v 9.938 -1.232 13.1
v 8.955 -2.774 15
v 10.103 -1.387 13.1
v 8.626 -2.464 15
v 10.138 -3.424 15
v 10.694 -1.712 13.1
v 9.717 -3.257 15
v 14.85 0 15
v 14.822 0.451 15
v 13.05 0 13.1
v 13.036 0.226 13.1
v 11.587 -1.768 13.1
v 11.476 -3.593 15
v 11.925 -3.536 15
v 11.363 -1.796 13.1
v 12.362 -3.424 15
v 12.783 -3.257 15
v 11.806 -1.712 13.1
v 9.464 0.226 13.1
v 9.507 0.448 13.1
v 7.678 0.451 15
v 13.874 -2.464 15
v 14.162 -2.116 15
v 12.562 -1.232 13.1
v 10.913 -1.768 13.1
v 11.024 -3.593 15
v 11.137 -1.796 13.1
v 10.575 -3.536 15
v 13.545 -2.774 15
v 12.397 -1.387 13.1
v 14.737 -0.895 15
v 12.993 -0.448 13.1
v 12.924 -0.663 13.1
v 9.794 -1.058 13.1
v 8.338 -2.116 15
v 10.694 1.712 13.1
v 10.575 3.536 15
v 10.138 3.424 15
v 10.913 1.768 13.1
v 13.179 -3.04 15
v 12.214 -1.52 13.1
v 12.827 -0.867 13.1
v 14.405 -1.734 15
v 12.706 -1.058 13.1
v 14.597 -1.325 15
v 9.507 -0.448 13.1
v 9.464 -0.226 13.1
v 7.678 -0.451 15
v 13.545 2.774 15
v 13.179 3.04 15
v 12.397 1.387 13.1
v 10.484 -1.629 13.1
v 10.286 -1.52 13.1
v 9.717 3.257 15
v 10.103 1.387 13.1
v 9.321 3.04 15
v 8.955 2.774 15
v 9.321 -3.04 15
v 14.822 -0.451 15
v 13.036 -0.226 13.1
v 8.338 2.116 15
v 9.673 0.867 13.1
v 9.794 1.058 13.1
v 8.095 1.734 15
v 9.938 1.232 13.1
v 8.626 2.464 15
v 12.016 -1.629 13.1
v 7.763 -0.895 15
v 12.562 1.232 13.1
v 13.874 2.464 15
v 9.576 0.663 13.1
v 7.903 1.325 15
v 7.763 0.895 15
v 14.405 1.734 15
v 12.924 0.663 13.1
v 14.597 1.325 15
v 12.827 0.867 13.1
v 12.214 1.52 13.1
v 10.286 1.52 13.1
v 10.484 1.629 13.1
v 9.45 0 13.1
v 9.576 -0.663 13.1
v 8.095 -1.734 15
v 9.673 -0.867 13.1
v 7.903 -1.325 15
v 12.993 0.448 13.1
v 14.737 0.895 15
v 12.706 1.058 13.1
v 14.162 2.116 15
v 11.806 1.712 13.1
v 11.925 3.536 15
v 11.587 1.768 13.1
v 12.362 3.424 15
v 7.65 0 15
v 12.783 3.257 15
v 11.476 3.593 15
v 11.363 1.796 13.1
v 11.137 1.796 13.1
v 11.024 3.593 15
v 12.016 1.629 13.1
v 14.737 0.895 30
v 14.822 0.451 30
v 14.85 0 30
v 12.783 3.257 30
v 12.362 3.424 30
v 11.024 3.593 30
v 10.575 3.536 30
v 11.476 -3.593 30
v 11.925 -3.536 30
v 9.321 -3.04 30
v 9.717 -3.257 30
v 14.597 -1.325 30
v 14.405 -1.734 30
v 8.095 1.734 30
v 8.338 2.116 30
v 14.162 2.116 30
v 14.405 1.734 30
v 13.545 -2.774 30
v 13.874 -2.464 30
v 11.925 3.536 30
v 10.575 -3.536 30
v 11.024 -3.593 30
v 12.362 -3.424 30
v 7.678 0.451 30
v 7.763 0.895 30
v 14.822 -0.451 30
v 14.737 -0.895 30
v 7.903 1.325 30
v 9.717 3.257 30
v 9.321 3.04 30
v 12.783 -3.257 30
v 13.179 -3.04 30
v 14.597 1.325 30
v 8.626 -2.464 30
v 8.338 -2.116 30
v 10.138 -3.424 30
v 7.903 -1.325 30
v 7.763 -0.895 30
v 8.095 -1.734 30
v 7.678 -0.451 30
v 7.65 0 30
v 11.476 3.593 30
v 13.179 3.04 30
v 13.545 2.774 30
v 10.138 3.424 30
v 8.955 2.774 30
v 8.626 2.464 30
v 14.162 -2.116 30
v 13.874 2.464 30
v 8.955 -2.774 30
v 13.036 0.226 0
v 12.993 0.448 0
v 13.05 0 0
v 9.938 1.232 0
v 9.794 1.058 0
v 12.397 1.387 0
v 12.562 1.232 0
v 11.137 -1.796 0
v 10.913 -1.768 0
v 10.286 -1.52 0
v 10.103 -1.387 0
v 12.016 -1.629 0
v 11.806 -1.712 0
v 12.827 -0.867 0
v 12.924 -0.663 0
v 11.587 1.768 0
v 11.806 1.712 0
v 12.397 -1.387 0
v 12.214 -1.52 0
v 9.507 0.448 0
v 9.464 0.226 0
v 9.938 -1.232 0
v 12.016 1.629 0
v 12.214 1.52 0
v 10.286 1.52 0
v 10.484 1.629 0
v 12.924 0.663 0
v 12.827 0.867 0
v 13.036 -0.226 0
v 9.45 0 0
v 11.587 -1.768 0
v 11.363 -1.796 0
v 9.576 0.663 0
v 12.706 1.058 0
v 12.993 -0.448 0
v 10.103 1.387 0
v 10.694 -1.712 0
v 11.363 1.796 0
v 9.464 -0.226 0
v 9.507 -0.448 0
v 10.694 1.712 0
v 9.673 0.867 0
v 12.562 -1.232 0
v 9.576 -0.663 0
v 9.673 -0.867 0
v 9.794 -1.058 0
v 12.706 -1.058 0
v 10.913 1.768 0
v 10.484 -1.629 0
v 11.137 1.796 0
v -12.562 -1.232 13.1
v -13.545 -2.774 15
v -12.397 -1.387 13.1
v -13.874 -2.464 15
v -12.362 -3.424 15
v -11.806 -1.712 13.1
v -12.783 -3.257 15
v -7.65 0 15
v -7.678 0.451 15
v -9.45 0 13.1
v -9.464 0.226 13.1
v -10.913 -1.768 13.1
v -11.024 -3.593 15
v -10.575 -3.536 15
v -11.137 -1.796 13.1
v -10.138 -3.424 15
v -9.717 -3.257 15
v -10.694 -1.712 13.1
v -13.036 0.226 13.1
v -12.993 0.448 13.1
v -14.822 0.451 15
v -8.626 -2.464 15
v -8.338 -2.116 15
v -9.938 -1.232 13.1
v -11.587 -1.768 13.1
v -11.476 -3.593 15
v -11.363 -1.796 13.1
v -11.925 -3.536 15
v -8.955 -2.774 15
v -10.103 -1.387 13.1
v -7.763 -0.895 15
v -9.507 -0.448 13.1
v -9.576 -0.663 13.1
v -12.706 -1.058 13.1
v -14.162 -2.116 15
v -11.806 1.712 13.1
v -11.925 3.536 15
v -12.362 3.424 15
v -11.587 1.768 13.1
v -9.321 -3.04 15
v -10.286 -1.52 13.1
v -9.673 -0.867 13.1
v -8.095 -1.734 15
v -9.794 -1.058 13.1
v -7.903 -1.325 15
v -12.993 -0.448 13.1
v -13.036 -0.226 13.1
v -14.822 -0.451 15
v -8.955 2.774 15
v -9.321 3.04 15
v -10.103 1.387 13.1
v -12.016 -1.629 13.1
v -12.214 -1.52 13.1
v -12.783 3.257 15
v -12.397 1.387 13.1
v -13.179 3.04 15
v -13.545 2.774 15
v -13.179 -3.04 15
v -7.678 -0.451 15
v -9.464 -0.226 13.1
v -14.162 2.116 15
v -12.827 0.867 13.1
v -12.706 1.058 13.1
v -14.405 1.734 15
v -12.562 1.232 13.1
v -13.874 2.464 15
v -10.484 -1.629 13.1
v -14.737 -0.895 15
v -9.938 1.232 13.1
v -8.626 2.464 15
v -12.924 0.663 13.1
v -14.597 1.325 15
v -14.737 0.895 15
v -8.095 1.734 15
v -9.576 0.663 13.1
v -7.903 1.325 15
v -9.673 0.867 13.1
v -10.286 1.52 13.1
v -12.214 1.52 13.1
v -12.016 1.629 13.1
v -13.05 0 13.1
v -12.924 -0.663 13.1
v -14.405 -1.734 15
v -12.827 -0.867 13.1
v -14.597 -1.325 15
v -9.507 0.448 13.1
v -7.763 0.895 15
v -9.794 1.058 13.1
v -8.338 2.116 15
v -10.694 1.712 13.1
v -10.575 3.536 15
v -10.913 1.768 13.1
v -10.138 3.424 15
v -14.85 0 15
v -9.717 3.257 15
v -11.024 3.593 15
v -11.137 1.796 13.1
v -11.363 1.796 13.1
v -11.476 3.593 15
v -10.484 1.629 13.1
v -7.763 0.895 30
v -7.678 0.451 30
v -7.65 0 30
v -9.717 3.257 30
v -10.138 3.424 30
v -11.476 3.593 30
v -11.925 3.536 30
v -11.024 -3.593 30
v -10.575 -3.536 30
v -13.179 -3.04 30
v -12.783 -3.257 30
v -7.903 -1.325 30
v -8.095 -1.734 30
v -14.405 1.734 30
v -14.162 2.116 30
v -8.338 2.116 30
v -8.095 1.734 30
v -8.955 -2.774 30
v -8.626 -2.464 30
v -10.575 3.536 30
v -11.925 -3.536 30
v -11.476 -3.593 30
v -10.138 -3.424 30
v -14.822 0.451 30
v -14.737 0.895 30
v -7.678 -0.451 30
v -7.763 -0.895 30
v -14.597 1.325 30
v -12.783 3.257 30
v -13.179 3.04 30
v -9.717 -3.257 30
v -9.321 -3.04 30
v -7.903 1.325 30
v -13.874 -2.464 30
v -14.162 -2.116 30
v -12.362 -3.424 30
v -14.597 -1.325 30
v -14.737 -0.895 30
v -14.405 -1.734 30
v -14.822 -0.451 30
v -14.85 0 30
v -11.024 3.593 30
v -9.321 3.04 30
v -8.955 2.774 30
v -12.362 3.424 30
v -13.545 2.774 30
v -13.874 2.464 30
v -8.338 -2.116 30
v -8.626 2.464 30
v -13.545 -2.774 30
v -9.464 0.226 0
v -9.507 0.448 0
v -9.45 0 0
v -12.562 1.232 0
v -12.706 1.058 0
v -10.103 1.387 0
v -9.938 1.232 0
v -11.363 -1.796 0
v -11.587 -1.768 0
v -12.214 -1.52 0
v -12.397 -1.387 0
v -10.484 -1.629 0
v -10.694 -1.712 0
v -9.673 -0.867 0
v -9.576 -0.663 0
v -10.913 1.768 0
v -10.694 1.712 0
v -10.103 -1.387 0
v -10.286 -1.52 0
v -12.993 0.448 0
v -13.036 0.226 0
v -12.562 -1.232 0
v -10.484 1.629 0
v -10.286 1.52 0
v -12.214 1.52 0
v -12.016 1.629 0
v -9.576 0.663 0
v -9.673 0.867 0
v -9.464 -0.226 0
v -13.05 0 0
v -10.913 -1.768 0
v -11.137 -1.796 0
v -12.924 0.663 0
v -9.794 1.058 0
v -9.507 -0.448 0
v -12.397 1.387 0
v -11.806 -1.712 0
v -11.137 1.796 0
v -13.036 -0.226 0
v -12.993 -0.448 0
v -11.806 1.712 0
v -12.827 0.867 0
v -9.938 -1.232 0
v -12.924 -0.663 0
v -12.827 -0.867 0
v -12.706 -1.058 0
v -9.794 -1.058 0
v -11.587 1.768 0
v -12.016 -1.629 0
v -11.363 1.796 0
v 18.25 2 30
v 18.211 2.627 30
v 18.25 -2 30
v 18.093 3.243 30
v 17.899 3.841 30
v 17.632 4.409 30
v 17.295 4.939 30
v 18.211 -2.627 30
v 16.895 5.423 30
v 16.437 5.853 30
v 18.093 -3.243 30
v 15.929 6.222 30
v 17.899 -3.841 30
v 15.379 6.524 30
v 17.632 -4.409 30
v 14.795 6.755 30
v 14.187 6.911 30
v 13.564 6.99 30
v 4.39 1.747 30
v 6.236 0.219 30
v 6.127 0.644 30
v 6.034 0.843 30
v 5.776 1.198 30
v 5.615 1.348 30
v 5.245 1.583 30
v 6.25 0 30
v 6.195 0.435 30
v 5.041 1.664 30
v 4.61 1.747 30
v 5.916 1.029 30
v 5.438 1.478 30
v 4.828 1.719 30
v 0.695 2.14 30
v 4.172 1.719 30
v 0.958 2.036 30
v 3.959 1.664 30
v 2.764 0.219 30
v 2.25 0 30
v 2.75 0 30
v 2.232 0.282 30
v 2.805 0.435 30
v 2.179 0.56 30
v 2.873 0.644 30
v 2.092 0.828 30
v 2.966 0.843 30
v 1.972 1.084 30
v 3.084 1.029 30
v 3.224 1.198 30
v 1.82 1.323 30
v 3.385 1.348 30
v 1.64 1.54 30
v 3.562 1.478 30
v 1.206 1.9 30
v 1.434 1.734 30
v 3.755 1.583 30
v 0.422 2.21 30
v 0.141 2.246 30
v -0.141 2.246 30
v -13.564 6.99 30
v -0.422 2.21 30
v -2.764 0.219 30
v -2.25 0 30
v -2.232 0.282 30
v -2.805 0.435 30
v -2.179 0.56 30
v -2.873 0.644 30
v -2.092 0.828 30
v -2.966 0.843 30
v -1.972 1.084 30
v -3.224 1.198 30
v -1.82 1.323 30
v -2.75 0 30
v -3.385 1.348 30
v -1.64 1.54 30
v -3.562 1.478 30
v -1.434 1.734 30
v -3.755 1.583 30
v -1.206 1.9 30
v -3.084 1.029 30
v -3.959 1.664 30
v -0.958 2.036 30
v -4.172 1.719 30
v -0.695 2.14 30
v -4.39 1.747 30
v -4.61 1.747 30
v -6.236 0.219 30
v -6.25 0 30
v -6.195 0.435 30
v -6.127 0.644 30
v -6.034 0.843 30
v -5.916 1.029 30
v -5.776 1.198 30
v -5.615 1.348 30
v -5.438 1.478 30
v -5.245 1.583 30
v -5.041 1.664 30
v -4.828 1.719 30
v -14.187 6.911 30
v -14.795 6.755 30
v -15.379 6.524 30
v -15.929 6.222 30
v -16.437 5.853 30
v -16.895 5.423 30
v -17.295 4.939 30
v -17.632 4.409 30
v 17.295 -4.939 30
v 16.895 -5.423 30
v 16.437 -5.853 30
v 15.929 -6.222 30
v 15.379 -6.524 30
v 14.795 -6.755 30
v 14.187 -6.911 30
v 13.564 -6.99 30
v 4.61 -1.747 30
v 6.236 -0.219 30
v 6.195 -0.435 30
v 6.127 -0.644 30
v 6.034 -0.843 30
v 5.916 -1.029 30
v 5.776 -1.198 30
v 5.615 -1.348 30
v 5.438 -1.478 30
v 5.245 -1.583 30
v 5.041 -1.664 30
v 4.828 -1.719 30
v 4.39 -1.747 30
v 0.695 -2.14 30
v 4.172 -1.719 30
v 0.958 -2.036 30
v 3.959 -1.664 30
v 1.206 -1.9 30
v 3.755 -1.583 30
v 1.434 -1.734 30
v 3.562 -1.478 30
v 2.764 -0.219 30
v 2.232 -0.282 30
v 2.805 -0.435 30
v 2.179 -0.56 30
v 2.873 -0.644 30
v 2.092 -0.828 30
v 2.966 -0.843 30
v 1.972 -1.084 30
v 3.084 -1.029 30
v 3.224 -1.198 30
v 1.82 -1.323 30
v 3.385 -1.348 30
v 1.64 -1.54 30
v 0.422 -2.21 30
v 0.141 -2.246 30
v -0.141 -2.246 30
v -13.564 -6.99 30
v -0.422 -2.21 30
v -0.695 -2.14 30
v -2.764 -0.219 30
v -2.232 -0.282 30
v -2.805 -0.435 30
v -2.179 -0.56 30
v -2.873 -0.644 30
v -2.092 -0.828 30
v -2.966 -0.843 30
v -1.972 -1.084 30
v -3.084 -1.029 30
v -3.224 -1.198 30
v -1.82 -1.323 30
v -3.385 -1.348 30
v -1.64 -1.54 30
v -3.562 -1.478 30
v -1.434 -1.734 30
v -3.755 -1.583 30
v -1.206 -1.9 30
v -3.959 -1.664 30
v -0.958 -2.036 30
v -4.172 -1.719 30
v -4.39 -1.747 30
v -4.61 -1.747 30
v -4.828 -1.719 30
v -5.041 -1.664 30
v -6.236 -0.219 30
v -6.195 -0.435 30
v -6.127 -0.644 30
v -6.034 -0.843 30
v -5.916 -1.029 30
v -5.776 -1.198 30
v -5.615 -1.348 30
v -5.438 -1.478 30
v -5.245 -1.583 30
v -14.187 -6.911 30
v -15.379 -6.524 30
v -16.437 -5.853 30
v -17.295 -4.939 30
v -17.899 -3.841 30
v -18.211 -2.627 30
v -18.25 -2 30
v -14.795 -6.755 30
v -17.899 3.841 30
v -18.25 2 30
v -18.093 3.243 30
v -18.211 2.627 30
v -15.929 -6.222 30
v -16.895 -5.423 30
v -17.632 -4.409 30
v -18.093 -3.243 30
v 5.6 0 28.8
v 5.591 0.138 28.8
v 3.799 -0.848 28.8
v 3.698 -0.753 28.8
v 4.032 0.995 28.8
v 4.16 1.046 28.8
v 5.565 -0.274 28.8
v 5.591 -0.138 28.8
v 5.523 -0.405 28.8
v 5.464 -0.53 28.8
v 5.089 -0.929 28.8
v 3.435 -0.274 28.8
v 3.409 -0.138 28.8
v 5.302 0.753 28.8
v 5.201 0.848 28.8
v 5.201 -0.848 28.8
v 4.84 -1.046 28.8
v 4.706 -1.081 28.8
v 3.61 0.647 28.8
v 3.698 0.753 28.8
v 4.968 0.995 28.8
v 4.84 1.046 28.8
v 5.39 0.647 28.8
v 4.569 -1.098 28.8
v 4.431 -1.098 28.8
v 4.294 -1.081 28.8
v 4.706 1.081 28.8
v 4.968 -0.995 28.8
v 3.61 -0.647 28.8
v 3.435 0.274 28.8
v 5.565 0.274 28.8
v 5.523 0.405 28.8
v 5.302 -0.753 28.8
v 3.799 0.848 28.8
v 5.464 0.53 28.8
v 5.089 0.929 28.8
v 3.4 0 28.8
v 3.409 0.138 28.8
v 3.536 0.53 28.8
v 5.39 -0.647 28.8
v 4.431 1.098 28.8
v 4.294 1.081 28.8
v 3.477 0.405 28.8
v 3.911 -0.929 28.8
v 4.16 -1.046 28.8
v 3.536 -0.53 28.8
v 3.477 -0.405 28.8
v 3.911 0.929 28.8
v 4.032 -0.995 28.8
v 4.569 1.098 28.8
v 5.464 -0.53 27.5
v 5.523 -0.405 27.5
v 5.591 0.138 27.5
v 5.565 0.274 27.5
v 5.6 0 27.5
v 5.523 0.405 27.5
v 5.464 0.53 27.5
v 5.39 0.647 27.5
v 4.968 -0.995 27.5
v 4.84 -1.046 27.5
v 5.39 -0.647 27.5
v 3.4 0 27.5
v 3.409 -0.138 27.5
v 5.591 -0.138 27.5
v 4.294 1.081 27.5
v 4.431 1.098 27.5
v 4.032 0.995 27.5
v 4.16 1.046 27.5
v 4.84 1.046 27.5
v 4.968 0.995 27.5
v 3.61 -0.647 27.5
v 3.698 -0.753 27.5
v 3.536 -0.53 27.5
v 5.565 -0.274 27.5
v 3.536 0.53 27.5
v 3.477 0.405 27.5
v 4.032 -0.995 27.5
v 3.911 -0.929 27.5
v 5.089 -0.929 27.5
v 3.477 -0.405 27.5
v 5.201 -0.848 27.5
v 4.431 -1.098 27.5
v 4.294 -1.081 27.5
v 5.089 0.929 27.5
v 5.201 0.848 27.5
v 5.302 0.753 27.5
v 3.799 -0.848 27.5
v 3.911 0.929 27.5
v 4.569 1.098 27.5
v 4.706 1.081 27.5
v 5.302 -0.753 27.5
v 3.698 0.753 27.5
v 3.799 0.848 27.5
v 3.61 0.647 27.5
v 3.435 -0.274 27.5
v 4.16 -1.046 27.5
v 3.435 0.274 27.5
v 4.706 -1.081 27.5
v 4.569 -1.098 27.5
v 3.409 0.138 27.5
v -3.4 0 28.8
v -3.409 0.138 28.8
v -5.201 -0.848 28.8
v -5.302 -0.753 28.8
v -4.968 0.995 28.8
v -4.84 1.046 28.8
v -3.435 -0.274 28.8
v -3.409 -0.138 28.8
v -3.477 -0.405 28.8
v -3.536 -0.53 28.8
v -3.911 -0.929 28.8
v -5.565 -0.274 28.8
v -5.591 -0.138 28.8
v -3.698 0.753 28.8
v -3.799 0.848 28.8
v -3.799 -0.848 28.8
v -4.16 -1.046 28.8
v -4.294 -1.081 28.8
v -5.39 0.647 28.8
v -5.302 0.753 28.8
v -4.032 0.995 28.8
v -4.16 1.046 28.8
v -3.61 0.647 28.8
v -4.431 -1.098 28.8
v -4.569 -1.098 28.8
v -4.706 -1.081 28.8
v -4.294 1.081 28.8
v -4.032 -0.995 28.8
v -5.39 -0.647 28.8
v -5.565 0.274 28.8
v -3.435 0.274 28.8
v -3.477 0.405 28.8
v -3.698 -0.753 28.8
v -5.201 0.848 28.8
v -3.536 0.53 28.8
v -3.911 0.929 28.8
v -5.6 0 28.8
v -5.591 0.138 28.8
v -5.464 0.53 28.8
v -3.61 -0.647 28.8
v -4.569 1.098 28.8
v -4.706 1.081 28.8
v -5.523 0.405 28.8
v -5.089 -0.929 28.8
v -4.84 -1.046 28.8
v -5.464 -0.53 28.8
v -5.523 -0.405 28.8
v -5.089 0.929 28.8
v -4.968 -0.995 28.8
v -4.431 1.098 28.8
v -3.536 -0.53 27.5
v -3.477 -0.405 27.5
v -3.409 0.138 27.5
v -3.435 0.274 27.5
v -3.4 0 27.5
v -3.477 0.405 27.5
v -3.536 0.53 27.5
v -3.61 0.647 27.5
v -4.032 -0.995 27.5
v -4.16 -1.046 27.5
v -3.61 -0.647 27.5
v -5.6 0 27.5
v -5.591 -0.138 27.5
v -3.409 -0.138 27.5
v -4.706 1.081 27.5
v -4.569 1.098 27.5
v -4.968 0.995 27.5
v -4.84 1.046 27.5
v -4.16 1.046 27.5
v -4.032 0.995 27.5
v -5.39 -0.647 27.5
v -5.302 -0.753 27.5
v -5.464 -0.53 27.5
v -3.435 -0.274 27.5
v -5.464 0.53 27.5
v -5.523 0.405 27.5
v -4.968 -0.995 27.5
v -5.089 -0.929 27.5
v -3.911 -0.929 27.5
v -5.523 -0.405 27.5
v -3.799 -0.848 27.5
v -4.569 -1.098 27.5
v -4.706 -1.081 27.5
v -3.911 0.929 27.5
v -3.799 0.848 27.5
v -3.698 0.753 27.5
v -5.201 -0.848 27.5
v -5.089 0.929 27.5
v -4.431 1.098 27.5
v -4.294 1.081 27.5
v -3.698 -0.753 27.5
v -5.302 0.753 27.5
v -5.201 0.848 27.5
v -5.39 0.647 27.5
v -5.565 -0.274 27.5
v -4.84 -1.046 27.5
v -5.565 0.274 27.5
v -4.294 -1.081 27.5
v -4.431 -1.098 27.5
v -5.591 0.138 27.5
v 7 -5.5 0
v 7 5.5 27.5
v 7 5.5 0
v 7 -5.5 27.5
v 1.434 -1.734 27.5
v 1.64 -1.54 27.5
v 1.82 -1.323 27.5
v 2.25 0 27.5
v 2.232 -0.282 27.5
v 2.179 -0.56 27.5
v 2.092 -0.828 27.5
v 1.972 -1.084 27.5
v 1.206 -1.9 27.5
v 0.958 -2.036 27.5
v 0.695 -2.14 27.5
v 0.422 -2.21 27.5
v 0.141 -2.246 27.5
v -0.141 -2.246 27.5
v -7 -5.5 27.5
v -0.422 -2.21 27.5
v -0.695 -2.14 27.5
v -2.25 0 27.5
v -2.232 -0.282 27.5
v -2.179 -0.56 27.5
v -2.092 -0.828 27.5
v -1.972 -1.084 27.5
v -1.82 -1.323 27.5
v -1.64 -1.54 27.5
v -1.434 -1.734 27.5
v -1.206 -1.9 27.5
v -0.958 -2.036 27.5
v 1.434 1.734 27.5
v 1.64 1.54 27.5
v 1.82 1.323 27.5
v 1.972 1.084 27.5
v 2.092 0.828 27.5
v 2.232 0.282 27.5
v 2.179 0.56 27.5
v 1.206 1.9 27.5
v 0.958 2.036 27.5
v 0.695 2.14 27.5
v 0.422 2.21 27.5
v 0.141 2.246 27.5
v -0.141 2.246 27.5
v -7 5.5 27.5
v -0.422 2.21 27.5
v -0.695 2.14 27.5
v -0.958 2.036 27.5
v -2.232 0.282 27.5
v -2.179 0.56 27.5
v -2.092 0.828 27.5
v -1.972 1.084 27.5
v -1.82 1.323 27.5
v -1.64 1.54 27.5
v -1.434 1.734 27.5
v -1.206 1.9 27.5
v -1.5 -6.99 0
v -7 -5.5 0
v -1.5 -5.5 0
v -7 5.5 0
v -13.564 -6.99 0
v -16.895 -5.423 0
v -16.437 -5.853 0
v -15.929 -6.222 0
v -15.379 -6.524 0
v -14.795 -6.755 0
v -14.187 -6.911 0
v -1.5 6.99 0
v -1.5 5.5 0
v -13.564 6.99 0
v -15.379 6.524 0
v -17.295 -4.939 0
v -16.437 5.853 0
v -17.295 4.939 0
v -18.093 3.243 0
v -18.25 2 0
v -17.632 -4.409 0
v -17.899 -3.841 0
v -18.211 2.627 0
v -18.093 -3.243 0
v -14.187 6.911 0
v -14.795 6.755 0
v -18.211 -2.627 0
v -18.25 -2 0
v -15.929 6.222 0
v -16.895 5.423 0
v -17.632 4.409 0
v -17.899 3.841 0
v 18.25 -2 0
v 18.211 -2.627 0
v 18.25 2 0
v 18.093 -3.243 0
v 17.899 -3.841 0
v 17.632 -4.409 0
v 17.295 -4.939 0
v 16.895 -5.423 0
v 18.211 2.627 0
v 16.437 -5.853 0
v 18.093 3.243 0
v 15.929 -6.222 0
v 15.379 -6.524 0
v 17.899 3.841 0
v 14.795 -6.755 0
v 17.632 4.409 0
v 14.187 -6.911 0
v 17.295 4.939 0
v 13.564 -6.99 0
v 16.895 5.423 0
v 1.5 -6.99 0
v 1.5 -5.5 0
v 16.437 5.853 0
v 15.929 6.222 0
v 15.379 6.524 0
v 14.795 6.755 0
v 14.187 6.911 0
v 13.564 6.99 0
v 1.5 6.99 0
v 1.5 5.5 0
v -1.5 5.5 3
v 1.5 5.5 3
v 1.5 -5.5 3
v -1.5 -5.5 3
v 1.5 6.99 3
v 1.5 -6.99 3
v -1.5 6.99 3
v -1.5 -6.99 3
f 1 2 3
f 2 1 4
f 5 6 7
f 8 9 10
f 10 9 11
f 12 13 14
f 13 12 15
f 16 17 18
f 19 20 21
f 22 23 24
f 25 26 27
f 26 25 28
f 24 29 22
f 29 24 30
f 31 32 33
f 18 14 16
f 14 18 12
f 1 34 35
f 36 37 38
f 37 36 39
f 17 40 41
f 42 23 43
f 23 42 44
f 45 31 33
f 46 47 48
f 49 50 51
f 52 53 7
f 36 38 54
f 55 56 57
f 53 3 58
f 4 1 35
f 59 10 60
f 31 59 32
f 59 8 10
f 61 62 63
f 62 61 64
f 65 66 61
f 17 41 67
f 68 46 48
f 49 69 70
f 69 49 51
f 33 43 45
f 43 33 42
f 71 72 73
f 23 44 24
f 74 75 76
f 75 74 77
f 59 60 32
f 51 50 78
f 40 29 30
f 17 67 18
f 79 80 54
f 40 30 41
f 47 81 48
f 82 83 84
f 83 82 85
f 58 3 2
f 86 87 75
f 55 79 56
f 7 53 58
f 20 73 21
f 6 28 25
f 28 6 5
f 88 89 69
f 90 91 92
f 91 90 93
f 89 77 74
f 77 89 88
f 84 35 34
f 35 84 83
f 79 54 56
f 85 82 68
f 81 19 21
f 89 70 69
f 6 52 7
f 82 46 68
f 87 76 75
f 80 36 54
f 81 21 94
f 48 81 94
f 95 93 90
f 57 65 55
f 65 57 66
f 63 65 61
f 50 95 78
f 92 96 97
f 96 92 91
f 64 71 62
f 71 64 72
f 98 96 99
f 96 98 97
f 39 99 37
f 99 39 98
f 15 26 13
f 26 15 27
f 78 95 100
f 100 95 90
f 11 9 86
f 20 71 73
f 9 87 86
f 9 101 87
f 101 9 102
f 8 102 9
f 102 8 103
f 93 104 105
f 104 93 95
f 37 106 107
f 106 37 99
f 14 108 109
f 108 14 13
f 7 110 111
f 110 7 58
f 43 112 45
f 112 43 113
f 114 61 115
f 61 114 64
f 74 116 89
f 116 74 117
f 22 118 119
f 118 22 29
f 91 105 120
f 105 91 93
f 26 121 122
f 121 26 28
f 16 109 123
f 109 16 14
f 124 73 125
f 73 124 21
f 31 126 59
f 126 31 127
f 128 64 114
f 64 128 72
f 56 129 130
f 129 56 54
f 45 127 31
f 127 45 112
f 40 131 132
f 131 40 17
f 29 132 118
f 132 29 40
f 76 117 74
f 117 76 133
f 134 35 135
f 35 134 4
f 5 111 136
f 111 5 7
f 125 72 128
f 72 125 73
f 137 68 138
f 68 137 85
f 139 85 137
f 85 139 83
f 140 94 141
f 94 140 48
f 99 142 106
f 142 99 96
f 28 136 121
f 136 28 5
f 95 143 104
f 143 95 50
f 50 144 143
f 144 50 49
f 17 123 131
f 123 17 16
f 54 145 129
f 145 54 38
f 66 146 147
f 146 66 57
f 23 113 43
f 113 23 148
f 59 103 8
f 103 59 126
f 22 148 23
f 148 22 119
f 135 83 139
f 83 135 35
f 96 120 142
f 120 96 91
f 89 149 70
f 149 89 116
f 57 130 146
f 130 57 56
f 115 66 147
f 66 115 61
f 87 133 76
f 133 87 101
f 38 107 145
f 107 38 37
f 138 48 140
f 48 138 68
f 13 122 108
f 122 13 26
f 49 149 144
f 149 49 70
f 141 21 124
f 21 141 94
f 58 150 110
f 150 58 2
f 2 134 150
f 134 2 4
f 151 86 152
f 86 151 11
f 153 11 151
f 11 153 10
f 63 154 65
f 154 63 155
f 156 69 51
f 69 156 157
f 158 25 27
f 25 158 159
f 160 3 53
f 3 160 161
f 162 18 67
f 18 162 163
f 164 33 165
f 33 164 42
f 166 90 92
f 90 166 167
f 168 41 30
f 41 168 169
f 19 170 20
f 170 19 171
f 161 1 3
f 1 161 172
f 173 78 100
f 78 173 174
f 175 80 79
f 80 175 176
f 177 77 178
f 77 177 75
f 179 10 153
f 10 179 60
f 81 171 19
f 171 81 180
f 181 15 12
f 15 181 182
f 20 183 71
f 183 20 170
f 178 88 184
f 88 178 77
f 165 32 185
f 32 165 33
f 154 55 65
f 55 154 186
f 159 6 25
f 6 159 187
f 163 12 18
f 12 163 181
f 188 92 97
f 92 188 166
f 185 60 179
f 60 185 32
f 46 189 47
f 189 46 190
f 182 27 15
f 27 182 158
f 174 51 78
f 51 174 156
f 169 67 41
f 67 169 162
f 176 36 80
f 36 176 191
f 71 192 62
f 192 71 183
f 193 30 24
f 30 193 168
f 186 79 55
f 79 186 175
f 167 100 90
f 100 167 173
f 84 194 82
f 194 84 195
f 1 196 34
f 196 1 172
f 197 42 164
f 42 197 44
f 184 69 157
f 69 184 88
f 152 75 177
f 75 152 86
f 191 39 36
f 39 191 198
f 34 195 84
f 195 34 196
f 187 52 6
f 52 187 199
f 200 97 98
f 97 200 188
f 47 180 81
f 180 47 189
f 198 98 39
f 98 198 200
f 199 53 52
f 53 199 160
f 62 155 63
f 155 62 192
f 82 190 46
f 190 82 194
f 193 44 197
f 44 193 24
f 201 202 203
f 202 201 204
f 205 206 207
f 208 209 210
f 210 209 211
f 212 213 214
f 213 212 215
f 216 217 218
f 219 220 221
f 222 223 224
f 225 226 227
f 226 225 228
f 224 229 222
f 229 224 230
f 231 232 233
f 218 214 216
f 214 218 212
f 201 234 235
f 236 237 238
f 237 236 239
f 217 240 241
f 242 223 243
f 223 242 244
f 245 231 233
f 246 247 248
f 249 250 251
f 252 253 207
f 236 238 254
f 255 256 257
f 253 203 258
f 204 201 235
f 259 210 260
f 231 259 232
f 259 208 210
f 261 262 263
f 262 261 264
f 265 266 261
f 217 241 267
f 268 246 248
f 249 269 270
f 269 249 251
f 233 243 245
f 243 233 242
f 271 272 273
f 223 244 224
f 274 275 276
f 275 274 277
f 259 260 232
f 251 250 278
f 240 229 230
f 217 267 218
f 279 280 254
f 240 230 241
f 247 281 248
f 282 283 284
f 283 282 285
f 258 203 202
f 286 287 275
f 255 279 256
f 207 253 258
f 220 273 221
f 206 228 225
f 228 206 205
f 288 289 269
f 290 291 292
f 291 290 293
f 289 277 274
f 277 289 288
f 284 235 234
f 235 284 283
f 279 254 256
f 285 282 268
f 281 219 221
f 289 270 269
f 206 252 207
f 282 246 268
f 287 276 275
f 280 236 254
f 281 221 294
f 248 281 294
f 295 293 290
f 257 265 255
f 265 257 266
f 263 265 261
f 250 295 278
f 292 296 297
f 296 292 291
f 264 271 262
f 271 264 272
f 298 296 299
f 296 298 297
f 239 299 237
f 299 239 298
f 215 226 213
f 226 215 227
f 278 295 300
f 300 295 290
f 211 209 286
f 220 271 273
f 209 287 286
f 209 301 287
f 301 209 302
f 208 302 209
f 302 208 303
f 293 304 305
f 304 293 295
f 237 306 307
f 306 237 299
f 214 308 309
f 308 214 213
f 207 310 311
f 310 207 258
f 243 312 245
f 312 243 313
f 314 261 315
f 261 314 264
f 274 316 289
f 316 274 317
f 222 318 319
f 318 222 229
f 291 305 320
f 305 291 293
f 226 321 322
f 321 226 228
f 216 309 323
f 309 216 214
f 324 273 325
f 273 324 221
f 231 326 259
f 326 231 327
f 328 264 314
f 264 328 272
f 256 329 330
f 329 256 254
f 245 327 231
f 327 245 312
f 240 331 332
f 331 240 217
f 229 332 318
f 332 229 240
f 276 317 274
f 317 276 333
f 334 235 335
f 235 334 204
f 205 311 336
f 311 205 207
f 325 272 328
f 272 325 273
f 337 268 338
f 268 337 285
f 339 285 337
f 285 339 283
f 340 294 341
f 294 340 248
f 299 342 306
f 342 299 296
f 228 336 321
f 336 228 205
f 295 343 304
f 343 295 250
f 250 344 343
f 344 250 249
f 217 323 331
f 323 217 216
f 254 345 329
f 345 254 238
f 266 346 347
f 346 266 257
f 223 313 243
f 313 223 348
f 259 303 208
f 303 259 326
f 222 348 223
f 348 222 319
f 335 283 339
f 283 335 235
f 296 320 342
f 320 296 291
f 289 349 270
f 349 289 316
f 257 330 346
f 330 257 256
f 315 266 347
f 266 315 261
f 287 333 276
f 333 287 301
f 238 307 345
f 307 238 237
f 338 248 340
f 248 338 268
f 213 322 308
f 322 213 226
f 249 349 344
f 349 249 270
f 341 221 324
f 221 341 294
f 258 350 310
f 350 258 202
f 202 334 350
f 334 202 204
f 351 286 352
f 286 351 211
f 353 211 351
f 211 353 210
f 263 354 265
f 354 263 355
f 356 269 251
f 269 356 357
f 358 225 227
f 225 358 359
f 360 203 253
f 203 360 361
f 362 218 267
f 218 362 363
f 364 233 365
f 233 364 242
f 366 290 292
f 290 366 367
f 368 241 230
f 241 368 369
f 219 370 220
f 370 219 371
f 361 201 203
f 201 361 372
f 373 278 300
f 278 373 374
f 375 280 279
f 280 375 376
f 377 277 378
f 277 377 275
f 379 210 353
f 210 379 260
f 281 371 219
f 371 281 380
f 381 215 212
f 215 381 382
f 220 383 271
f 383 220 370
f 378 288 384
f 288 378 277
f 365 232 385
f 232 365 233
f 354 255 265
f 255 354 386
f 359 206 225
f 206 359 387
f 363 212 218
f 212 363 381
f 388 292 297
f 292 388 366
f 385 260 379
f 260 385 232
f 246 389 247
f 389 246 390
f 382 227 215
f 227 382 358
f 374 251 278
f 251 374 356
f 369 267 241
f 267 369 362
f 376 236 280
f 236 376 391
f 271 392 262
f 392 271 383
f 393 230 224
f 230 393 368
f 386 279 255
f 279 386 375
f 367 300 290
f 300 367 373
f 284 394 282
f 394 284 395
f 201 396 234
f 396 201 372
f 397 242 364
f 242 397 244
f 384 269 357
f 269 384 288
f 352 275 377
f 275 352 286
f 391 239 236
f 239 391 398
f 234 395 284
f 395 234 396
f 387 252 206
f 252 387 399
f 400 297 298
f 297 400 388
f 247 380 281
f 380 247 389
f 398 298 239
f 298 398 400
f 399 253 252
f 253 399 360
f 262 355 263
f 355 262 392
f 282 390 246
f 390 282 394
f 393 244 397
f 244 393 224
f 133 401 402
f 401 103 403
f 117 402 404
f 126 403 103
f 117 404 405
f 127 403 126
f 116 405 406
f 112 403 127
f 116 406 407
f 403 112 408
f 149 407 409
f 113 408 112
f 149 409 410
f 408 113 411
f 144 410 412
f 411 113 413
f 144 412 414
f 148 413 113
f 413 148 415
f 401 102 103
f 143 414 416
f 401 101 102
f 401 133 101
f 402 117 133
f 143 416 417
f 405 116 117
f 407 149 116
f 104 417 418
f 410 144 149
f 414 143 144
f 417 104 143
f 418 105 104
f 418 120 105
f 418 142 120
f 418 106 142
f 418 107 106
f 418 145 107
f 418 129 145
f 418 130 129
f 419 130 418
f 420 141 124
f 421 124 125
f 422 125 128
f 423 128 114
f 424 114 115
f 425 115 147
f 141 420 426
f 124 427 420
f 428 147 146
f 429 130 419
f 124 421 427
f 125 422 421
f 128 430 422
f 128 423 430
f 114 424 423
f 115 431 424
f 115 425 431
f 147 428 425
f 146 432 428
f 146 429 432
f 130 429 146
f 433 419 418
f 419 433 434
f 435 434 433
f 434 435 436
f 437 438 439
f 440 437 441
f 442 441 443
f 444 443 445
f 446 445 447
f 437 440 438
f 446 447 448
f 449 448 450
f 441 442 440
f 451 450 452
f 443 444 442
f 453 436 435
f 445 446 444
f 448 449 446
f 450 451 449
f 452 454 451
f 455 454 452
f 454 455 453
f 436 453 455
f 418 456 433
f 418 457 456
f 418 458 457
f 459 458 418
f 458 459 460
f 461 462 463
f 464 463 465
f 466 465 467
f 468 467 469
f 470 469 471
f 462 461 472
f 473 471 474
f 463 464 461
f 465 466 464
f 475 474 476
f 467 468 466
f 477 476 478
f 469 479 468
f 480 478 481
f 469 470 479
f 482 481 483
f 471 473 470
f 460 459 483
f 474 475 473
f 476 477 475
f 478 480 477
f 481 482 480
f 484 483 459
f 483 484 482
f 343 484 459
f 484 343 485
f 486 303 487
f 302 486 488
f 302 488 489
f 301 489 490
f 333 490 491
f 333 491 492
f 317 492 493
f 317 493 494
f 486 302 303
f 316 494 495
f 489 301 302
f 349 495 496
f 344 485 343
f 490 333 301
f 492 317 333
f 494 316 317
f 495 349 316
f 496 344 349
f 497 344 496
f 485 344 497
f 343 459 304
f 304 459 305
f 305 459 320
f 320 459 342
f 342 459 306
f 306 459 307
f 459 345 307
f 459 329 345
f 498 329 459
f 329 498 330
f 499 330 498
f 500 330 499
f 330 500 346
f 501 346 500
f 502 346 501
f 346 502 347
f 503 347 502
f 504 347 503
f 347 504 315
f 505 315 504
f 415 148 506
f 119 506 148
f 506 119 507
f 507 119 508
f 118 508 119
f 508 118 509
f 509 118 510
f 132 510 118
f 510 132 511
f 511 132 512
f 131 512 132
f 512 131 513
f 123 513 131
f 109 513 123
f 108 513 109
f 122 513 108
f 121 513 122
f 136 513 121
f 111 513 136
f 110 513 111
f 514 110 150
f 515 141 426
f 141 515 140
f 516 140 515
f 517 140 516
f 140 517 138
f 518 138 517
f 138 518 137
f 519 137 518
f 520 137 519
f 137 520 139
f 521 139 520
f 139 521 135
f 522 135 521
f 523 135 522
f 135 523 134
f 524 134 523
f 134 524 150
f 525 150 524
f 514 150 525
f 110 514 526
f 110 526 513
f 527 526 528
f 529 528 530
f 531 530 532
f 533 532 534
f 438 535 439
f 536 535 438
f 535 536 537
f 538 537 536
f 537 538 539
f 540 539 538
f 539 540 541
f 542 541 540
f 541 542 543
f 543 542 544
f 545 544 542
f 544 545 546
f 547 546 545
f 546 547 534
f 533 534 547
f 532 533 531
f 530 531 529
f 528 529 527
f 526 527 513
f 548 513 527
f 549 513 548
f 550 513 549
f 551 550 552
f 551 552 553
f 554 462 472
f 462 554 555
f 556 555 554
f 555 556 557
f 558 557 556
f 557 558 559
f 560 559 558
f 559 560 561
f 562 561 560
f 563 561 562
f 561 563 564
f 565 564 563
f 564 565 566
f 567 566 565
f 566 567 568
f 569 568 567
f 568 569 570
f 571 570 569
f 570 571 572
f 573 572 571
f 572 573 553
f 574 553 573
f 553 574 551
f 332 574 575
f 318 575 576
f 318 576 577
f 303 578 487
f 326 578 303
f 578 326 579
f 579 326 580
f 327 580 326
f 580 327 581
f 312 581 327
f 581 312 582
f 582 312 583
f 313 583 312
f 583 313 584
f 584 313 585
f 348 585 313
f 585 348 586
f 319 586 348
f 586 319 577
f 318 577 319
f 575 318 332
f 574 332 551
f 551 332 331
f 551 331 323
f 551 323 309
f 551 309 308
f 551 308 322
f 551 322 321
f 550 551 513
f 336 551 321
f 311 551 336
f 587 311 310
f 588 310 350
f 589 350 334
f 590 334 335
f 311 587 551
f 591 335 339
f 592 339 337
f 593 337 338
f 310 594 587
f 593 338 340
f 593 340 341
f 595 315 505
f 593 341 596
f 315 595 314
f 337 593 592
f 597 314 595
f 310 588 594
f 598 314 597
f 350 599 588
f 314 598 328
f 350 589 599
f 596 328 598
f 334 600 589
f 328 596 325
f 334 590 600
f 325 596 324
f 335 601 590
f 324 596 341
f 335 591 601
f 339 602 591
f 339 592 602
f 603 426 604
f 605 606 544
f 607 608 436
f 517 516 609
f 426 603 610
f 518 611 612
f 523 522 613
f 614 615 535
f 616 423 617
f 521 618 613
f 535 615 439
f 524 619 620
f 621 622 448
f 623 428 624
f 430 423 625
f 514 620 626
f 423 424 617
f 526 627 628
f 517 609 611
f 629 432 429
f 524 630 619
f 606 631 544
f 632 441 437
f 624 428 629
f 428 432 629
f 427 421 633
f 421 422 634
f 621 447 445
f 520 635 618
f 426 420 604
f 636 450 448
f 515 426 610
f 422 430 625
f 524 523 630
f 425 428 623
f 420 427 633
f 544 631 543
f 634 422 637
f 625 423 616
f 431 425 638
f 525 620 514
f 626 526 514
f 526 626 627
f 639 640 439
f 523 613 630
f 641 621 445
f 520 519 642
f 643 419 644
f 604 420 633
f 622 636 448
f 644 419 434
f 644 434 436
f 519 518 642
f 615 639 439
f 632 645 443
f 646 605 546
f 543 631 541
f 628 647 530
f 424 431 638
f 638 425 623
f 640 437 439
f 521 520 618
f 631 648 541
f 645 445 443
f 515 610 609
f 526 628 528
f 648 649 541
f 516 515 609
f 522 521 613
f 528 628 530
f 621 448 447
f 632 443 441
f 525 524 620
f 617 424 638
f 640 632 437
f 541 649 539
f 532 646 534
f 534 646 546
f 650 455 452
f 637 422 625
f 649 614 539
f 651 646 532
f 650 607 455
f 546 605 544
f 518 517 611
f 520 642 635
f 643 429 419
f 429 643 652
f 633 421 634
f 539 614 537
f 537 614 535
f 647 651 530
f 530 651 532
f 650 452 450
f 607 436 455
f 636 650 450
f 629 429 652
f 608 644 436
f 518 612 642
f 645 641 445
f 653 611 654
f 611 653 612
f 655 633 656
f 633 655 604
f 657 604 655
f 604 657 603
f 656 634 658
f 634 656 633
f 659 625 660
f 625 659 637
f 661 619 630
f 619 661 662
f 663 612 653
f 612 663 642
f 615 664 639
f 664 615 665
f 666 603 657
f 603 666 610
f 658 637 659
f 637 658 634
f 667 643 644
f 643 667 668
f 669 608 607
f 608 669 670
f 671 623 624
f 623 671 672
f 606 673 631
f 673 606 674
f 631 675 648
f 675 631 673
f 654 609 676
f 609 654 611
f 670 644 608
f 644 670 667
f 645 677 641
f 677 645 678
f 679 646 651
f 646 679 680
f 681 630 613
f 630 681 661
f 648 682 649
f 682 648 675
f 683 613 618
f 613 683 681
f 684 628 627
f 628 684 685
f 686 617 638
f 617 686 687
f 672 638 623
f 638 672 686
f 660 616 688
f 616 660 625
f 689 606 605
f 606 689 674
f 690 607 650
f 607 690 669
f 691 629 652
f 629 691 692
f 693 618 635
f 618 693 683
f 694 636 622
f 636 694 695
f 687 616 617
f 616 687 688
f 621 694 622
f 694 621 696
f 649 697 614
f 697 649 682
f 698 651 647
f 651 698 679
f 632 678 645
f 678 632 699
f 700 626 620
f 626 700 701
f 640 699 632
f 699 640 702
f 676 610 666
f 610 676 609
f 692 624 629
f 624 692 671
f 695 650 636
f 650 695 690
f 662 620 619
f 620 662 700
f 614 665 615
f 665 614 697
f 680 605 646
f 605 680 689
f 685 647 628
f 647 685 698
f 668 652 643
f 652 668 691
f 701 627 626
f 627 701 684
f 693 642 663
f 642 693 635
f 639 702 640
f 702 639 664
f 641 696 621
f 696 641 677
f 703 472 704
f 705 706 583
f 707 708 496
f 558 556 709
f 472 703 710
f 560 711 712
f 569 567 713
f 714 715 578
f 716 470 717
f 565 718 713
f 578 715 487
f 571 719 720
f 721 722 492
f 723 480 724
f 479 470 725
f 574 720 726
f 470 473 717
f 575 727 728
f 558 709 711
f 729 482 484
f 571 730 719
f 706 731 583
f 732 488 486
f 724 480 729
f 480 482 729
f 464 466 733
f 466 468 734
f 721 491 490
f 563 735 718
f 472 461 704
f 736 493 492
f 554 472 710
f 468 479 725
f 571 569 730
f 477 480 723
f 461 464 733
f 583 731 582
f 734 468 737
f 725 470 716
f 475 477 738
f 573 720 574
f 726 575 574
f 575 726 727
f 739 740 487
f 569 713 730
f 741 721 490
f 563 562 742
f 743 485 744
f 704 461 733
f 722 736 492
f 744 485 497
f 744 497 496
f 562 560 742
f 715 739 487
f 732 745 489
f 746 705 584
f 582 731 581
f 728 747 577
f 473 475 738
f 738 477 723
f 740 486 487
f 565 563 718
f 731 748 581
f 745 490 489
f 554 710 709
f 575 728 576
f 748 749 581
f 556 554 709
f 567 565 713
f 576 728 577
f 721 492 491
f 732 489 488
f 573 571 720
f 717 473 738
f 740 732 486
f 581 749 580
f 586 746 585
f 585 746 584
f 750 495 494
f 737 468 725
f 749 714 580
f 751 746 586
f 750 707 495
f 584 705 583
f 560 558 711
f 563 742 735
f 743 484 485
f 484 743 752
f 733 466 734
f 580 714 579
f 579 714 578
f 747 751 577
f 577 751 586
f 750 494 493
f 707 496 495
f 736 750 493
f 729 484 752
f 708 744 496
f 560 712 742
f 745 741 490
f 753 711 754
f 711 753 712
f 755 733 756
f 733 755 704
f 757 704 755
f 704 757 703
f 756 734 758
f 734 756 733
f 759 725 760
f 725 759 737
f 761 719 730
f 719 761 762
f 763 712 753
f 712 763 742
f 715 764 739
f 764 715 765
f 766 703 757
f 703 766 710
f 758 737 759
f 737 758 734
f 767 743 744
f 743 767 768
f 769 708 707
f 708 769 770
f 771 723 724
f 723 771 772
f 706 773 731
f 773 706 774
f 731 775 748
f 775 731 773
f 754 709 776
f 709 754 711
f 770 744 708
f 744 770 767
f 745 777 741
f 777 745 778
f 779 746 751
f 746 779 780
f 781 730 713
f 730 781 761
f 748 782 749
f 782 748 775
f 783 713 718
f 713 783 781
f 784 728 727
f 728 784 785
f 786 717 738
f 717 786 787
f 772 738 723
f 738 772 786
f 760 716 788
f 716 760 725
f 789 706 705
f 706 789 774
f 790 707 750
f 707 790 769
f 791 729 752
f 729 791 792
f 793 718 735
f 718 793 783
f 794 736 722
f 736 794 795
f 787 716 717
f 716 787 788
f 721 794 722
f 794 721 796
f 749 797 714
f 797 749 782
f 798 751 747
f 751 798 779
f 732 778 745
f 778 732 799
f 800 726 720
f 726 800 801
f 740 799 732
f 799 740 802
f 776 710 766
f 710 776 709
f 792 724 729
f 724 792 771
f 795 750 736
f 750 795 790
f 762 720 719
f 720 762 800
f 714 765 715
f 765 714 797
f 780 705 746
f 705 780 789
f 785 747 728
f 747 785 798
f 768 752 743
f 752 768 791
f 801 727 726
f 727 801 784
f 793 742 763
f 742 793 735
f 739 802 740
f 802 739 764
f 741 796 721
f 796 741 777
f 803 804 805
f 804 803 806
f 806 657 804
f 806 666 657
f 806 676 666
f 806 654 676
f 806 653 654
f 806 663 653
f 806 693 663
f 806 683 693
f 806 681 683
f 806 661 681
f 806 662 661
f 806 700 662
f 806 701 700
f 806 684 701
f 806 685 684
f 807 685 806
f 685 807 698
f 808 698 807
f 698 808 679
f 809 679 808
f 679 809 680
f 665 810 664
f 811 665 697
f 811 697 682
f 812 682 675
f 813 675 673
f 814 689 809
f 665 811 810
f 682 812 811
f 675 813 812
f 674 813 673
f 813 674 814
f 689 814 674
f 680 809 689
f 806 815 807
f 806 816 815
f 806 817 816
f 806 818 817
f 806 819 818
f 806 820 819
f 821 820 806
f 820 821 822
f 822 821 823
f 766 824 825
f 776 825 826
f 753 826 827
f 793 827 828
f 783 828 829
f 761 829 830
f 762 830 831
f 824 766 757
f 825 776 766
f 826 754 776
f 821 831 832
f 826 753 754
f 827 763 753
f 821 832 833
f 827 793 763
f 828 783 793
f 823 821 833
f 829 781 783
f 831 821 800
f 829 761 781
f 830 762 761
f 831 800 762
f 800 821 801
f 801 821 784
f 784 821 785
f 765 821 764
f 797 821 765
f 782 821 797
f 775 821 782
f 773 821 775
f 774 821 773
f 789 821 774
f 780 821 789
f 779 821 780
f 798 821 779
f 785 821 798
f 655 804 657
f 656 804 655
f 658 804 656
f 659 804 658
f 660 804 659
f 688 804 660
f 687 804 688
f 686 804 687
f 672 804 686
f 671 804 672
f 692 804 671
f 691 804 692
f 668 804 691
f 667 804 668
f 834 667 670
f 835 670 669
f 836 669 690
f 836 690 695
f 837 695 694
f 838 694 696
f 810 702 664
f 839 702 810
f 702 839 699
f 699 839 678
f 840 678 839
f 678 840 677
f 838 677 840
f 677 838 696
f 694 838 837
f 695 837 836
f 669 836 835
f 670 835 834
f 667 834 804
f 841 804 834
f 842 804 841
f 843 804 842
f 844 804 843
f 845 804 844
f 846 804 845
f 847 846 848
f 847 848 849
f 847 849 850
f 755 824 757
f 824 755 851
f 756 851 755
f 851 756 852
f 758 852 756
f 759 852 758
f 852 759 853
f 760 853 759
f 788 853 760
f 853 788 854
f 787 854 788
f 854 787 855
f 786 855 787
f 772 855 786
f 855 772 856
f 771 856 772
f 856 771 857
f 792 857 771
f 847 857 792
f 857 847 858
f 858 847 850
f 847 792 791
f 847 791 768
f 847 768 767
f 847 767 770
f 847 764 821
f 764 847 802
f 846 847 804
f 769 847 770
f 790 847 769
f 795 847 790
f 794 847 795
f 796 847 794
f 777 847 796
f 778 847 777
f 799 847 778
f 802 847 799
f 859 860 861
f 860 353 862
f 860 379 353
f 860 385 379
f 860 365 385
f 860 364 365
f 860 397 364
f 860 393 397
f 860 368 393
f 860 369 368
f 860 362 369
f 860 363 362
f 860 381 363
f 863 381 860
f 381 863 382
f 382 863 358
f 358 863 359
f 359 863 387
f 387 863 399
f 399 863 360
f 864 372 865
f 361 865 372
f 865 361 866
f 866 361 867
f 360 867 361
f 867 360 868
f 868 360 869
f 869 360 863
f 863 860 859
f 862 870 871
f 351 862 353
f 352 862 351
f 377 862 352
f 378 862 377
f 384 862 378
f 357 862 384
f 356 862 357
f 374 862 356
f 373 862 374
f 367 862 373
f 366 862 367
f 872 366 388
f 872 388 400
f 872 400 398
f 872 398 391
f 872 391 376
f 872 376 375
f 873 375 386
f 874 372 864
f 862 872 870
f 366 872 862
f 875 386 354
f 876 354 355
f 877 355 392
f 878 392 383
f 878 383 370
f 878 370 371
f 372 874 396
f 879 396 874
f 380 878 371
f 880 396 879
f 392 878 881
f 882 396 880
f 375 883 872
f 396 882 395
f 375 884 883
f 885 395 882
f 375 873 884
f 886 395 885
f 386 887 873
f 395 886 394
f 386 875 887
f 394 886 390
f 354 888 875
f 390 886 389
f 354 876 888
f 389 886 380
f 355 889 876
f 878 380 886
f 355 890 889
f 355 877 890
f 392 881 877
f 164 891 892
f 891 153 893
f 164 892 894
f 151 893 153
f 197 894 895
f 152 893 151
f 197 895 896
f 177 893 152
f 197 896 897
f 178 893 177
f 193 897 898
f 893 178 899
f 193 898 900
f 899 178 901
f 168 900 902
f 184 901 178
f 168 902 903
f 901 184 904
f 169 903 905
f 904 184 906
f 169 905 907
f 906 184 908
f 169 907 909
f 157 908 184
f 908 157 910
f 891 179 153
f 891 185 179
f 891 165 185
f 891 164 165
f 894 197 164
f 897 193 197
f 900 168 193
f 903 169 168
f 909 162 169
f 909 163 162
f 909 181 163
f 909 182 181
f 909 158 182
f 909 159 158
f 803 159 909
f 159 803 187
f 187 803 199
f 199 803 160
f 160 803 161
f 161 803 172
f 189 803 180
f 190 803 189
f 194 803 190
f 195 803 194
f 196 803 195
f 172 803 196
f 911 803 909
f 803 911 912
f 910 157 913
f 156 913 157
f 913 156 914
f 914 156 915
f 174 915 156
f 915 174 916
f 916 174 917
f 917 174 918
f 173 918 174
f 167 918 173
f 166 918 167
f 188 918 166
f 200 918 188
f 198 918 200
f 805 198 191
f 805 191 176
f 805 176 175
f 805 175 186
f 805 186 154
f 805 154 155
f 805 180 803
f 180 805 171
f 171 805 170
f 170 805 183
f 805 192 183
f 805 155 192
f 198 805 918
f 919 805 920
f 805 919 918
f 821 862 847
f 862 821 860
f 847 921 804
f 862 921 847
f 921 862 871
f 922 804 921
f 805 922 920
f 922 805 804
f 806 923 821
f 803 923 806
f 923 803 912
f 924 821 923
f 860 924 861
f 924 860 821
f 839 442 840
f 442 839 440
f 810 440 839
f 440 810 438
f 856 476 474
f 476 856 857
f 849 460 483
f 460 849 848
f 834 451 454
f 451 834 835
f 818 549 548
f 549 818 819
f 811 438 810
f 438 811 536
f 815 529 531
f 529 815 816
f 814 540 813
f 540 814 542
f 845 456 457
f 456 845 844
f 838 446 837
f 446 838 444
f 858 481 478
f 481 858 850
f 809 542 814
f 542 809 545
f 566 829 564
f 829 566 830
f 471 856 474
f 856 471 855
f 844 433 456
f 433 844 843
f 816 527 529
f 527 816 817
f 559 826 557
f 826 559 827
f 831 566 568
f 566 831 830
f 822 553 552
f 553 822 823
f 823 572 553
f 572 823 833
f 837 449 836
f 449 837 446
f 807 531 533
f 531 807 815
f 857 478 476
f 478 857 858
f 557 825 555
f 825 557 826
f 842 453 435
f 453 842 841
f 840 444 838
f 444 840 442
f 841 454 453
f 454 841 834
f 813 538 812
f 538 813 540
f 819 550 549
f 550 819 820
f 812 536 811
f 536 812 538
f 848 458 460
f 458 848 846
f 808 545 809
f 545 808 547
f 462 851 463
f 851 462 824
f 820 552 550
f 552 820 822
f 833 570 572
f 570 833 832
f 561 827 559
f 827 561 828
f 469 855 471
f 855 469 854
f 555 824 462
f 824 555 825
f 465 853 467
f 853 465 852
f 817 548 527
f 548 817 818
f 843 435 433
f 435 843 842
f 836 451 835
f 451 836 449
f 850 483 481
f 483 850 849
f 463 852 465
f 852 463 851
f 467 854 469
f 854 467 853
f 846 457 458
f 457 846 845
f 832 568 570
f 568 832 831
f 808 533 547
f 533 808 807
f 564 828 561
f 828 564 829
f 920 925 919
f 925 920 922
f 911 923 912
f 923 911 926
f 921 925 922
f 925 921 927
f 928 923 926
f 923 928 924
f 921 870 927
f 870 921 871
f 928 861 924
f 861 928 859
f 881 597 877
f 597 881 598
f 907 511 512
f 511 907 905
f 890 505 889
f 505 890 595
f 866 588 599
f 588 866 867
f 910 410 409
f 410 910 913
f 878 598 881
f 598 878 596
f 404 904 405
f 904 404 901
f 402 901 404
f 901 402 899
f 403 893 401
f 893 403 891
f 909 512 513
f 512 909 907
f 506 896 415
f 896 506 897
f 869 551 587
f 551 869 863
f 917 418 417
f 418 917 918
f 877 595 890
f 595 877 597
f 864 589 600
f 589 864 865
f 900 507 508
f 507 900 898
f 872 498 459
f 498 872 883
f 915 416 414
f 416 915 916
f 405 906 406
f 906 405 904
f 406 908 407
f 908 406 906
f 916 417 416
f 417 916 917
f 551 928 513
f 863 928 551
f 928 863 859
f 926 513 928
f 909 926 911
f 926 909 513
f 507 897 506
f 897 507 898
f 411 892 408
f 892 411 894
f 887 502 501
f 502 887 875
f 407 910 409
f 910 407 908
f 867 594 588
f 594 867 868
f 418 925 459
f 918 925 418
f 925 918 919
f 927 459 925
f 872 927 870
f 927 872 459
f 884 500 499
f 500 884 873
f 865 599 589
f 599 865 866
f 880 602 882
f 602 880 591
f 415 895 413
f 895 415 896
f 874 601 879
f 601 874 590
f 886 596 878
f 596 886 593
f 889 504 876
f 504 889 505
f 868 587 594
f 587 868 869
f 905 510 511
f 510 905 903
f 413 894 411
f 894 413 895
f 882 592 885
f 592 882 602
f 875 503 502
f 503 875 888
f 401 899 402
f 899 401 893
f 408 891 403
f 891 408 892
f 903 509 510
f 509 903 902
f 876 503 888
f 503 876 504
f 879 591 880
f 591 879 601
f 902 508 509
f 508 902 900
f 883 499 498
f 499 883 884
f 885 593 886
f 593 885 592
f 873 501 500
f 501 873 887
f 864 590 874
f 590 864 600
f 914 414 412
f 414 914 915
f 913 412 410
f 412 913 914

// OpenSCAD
$fn = 50;


difference() {
	union() {
		hull() {
			translate(v = [-13.2500000000, 2.0000000000, 0]) {
				cylinder(h = 30, r = 5);
			}
			translate(v = [13.2500000000, 2.0000000000, 0]) {
				cylinder(h = 30, r = 5);
			}
			translate(v = [-13.2500000000, -2.0000000000, 0]) {
				cylinder(h = 30, r = 5);
			}
			translate(v = [13.2500000000, -2.0000000000, 0]) {
				cylinder(h = 30, r = 5);
			}
		}
	}
	union() {
		translate(v = [11.2500000000, 0, 15.0000000000]) {
			rotate(a = [0, 0, 0]) {
				difference() {
					union() {
						#translate(v = [0, 0, -30.0000000000]) {
							cylinder(h = 30, r = 1.5000000000);
						}
						#translate(v = [0, 0, -1.9000000000]) {
							cylinder(h = 1.9000000000, r1 = 1.8000000000, r2 = 3.6000000000);
						}
						#cylinder(h = 50, r = 3.6000000000);
						#translate(v = [0, 0, -30.0000000000]) {
							cylinder(h = 30, r = 1.8000000000);
						}
						#translate(v = [0, 0, -30.0000000000]) {
							cylinder(h = 30, r = 1.5000000000);
						}
					}
					union();
				}
			}
		}
		translate(v = [-11.2500000000, 0, 15.0000000000]) {
			rotate(a = [0, 0, 0]) {
				difference() {
					union() {
						#translate(v = [0, 0, -30.0000000000]) {
							cylinder(h = 30, r = 1.5000000000);
						}
						#translate(v = [0, 0, -1.9000000000]) {
							cylinder(h = 1.9000000000, r1 = 1.8000000000, r2 = 3.6000000000);
						}
						#cylinder(h = 50, r = 3.6000000000);
						#translate(v = [0, 0, -30.0000000000]) {
							cylinder(h = 30, r = 1.8000000000);
						}
						#translate(v = [0, 0, -30.0000000000]) {
							cylinder(h = 30, r = 1.5000000000);
						}
					}
					union();
				}
			}
		}
		translate(v = [4.5000000000, 0, 30]) {
			rotate(a = [0, 0, 0]) {
				difference() {
					union() {
						translate(v = [0, 0, -4.0000000000]) {
							cylinder(h = 4, r = 0.8500000000);
						}
						translate(v = [0, 0, -1.2000000000]) {
							cylinder(h = 1.2000000000, r1 = 1.1000000000, r2 = 1.7500000000);
						}
						translate(v = [0, 0, -4.0000000000]) {
							cylinder(h = 4, r = 1.1000000000);
						}
						translate(v = [0, 0, -4.0000000000]) {
							cylinder(h = 4, r = 0.8500000000);
						}
					}
					union();
				}
			}
		}
		translate(v = [-4.5000000000, 0, 30]) {
			rotate(a = [0, 0, 0]) {
				difference() {
					union() {
						translate(v = [0, 0, -4.0000000000]) {
							cylinder(h = 4, r = 0.8500000000);
						}
						translate(v = [0, 0, -1.2000000000]) {
							cylinder(h = 1.2000000000, r1 = 1.1000000000, r2 = 1.7500000000);
						}
						translate(v = [0, 0, -4.0000000000]) {
							cylinder(h = 4, r = 1.1000000000);
						}
						translate(v = [0, 0, -4.0000000000]) {
							cylinder(h = 4, r = 0.8500000000);
						}
					}
					union();
				}
			}
		}
		#translate(v = [-7.0000000000, -5.5000000000, 0]) {
			cube(size = [14, 11, 27.5000000000]);
		}
		cylinder(h = 30, r = 2.2500000000);
		translate(v = [-1.5000000000, -18.7500000000, 0]) {
			cube(size = [3, 37.5000000000, 3]);
		}
	}
}
